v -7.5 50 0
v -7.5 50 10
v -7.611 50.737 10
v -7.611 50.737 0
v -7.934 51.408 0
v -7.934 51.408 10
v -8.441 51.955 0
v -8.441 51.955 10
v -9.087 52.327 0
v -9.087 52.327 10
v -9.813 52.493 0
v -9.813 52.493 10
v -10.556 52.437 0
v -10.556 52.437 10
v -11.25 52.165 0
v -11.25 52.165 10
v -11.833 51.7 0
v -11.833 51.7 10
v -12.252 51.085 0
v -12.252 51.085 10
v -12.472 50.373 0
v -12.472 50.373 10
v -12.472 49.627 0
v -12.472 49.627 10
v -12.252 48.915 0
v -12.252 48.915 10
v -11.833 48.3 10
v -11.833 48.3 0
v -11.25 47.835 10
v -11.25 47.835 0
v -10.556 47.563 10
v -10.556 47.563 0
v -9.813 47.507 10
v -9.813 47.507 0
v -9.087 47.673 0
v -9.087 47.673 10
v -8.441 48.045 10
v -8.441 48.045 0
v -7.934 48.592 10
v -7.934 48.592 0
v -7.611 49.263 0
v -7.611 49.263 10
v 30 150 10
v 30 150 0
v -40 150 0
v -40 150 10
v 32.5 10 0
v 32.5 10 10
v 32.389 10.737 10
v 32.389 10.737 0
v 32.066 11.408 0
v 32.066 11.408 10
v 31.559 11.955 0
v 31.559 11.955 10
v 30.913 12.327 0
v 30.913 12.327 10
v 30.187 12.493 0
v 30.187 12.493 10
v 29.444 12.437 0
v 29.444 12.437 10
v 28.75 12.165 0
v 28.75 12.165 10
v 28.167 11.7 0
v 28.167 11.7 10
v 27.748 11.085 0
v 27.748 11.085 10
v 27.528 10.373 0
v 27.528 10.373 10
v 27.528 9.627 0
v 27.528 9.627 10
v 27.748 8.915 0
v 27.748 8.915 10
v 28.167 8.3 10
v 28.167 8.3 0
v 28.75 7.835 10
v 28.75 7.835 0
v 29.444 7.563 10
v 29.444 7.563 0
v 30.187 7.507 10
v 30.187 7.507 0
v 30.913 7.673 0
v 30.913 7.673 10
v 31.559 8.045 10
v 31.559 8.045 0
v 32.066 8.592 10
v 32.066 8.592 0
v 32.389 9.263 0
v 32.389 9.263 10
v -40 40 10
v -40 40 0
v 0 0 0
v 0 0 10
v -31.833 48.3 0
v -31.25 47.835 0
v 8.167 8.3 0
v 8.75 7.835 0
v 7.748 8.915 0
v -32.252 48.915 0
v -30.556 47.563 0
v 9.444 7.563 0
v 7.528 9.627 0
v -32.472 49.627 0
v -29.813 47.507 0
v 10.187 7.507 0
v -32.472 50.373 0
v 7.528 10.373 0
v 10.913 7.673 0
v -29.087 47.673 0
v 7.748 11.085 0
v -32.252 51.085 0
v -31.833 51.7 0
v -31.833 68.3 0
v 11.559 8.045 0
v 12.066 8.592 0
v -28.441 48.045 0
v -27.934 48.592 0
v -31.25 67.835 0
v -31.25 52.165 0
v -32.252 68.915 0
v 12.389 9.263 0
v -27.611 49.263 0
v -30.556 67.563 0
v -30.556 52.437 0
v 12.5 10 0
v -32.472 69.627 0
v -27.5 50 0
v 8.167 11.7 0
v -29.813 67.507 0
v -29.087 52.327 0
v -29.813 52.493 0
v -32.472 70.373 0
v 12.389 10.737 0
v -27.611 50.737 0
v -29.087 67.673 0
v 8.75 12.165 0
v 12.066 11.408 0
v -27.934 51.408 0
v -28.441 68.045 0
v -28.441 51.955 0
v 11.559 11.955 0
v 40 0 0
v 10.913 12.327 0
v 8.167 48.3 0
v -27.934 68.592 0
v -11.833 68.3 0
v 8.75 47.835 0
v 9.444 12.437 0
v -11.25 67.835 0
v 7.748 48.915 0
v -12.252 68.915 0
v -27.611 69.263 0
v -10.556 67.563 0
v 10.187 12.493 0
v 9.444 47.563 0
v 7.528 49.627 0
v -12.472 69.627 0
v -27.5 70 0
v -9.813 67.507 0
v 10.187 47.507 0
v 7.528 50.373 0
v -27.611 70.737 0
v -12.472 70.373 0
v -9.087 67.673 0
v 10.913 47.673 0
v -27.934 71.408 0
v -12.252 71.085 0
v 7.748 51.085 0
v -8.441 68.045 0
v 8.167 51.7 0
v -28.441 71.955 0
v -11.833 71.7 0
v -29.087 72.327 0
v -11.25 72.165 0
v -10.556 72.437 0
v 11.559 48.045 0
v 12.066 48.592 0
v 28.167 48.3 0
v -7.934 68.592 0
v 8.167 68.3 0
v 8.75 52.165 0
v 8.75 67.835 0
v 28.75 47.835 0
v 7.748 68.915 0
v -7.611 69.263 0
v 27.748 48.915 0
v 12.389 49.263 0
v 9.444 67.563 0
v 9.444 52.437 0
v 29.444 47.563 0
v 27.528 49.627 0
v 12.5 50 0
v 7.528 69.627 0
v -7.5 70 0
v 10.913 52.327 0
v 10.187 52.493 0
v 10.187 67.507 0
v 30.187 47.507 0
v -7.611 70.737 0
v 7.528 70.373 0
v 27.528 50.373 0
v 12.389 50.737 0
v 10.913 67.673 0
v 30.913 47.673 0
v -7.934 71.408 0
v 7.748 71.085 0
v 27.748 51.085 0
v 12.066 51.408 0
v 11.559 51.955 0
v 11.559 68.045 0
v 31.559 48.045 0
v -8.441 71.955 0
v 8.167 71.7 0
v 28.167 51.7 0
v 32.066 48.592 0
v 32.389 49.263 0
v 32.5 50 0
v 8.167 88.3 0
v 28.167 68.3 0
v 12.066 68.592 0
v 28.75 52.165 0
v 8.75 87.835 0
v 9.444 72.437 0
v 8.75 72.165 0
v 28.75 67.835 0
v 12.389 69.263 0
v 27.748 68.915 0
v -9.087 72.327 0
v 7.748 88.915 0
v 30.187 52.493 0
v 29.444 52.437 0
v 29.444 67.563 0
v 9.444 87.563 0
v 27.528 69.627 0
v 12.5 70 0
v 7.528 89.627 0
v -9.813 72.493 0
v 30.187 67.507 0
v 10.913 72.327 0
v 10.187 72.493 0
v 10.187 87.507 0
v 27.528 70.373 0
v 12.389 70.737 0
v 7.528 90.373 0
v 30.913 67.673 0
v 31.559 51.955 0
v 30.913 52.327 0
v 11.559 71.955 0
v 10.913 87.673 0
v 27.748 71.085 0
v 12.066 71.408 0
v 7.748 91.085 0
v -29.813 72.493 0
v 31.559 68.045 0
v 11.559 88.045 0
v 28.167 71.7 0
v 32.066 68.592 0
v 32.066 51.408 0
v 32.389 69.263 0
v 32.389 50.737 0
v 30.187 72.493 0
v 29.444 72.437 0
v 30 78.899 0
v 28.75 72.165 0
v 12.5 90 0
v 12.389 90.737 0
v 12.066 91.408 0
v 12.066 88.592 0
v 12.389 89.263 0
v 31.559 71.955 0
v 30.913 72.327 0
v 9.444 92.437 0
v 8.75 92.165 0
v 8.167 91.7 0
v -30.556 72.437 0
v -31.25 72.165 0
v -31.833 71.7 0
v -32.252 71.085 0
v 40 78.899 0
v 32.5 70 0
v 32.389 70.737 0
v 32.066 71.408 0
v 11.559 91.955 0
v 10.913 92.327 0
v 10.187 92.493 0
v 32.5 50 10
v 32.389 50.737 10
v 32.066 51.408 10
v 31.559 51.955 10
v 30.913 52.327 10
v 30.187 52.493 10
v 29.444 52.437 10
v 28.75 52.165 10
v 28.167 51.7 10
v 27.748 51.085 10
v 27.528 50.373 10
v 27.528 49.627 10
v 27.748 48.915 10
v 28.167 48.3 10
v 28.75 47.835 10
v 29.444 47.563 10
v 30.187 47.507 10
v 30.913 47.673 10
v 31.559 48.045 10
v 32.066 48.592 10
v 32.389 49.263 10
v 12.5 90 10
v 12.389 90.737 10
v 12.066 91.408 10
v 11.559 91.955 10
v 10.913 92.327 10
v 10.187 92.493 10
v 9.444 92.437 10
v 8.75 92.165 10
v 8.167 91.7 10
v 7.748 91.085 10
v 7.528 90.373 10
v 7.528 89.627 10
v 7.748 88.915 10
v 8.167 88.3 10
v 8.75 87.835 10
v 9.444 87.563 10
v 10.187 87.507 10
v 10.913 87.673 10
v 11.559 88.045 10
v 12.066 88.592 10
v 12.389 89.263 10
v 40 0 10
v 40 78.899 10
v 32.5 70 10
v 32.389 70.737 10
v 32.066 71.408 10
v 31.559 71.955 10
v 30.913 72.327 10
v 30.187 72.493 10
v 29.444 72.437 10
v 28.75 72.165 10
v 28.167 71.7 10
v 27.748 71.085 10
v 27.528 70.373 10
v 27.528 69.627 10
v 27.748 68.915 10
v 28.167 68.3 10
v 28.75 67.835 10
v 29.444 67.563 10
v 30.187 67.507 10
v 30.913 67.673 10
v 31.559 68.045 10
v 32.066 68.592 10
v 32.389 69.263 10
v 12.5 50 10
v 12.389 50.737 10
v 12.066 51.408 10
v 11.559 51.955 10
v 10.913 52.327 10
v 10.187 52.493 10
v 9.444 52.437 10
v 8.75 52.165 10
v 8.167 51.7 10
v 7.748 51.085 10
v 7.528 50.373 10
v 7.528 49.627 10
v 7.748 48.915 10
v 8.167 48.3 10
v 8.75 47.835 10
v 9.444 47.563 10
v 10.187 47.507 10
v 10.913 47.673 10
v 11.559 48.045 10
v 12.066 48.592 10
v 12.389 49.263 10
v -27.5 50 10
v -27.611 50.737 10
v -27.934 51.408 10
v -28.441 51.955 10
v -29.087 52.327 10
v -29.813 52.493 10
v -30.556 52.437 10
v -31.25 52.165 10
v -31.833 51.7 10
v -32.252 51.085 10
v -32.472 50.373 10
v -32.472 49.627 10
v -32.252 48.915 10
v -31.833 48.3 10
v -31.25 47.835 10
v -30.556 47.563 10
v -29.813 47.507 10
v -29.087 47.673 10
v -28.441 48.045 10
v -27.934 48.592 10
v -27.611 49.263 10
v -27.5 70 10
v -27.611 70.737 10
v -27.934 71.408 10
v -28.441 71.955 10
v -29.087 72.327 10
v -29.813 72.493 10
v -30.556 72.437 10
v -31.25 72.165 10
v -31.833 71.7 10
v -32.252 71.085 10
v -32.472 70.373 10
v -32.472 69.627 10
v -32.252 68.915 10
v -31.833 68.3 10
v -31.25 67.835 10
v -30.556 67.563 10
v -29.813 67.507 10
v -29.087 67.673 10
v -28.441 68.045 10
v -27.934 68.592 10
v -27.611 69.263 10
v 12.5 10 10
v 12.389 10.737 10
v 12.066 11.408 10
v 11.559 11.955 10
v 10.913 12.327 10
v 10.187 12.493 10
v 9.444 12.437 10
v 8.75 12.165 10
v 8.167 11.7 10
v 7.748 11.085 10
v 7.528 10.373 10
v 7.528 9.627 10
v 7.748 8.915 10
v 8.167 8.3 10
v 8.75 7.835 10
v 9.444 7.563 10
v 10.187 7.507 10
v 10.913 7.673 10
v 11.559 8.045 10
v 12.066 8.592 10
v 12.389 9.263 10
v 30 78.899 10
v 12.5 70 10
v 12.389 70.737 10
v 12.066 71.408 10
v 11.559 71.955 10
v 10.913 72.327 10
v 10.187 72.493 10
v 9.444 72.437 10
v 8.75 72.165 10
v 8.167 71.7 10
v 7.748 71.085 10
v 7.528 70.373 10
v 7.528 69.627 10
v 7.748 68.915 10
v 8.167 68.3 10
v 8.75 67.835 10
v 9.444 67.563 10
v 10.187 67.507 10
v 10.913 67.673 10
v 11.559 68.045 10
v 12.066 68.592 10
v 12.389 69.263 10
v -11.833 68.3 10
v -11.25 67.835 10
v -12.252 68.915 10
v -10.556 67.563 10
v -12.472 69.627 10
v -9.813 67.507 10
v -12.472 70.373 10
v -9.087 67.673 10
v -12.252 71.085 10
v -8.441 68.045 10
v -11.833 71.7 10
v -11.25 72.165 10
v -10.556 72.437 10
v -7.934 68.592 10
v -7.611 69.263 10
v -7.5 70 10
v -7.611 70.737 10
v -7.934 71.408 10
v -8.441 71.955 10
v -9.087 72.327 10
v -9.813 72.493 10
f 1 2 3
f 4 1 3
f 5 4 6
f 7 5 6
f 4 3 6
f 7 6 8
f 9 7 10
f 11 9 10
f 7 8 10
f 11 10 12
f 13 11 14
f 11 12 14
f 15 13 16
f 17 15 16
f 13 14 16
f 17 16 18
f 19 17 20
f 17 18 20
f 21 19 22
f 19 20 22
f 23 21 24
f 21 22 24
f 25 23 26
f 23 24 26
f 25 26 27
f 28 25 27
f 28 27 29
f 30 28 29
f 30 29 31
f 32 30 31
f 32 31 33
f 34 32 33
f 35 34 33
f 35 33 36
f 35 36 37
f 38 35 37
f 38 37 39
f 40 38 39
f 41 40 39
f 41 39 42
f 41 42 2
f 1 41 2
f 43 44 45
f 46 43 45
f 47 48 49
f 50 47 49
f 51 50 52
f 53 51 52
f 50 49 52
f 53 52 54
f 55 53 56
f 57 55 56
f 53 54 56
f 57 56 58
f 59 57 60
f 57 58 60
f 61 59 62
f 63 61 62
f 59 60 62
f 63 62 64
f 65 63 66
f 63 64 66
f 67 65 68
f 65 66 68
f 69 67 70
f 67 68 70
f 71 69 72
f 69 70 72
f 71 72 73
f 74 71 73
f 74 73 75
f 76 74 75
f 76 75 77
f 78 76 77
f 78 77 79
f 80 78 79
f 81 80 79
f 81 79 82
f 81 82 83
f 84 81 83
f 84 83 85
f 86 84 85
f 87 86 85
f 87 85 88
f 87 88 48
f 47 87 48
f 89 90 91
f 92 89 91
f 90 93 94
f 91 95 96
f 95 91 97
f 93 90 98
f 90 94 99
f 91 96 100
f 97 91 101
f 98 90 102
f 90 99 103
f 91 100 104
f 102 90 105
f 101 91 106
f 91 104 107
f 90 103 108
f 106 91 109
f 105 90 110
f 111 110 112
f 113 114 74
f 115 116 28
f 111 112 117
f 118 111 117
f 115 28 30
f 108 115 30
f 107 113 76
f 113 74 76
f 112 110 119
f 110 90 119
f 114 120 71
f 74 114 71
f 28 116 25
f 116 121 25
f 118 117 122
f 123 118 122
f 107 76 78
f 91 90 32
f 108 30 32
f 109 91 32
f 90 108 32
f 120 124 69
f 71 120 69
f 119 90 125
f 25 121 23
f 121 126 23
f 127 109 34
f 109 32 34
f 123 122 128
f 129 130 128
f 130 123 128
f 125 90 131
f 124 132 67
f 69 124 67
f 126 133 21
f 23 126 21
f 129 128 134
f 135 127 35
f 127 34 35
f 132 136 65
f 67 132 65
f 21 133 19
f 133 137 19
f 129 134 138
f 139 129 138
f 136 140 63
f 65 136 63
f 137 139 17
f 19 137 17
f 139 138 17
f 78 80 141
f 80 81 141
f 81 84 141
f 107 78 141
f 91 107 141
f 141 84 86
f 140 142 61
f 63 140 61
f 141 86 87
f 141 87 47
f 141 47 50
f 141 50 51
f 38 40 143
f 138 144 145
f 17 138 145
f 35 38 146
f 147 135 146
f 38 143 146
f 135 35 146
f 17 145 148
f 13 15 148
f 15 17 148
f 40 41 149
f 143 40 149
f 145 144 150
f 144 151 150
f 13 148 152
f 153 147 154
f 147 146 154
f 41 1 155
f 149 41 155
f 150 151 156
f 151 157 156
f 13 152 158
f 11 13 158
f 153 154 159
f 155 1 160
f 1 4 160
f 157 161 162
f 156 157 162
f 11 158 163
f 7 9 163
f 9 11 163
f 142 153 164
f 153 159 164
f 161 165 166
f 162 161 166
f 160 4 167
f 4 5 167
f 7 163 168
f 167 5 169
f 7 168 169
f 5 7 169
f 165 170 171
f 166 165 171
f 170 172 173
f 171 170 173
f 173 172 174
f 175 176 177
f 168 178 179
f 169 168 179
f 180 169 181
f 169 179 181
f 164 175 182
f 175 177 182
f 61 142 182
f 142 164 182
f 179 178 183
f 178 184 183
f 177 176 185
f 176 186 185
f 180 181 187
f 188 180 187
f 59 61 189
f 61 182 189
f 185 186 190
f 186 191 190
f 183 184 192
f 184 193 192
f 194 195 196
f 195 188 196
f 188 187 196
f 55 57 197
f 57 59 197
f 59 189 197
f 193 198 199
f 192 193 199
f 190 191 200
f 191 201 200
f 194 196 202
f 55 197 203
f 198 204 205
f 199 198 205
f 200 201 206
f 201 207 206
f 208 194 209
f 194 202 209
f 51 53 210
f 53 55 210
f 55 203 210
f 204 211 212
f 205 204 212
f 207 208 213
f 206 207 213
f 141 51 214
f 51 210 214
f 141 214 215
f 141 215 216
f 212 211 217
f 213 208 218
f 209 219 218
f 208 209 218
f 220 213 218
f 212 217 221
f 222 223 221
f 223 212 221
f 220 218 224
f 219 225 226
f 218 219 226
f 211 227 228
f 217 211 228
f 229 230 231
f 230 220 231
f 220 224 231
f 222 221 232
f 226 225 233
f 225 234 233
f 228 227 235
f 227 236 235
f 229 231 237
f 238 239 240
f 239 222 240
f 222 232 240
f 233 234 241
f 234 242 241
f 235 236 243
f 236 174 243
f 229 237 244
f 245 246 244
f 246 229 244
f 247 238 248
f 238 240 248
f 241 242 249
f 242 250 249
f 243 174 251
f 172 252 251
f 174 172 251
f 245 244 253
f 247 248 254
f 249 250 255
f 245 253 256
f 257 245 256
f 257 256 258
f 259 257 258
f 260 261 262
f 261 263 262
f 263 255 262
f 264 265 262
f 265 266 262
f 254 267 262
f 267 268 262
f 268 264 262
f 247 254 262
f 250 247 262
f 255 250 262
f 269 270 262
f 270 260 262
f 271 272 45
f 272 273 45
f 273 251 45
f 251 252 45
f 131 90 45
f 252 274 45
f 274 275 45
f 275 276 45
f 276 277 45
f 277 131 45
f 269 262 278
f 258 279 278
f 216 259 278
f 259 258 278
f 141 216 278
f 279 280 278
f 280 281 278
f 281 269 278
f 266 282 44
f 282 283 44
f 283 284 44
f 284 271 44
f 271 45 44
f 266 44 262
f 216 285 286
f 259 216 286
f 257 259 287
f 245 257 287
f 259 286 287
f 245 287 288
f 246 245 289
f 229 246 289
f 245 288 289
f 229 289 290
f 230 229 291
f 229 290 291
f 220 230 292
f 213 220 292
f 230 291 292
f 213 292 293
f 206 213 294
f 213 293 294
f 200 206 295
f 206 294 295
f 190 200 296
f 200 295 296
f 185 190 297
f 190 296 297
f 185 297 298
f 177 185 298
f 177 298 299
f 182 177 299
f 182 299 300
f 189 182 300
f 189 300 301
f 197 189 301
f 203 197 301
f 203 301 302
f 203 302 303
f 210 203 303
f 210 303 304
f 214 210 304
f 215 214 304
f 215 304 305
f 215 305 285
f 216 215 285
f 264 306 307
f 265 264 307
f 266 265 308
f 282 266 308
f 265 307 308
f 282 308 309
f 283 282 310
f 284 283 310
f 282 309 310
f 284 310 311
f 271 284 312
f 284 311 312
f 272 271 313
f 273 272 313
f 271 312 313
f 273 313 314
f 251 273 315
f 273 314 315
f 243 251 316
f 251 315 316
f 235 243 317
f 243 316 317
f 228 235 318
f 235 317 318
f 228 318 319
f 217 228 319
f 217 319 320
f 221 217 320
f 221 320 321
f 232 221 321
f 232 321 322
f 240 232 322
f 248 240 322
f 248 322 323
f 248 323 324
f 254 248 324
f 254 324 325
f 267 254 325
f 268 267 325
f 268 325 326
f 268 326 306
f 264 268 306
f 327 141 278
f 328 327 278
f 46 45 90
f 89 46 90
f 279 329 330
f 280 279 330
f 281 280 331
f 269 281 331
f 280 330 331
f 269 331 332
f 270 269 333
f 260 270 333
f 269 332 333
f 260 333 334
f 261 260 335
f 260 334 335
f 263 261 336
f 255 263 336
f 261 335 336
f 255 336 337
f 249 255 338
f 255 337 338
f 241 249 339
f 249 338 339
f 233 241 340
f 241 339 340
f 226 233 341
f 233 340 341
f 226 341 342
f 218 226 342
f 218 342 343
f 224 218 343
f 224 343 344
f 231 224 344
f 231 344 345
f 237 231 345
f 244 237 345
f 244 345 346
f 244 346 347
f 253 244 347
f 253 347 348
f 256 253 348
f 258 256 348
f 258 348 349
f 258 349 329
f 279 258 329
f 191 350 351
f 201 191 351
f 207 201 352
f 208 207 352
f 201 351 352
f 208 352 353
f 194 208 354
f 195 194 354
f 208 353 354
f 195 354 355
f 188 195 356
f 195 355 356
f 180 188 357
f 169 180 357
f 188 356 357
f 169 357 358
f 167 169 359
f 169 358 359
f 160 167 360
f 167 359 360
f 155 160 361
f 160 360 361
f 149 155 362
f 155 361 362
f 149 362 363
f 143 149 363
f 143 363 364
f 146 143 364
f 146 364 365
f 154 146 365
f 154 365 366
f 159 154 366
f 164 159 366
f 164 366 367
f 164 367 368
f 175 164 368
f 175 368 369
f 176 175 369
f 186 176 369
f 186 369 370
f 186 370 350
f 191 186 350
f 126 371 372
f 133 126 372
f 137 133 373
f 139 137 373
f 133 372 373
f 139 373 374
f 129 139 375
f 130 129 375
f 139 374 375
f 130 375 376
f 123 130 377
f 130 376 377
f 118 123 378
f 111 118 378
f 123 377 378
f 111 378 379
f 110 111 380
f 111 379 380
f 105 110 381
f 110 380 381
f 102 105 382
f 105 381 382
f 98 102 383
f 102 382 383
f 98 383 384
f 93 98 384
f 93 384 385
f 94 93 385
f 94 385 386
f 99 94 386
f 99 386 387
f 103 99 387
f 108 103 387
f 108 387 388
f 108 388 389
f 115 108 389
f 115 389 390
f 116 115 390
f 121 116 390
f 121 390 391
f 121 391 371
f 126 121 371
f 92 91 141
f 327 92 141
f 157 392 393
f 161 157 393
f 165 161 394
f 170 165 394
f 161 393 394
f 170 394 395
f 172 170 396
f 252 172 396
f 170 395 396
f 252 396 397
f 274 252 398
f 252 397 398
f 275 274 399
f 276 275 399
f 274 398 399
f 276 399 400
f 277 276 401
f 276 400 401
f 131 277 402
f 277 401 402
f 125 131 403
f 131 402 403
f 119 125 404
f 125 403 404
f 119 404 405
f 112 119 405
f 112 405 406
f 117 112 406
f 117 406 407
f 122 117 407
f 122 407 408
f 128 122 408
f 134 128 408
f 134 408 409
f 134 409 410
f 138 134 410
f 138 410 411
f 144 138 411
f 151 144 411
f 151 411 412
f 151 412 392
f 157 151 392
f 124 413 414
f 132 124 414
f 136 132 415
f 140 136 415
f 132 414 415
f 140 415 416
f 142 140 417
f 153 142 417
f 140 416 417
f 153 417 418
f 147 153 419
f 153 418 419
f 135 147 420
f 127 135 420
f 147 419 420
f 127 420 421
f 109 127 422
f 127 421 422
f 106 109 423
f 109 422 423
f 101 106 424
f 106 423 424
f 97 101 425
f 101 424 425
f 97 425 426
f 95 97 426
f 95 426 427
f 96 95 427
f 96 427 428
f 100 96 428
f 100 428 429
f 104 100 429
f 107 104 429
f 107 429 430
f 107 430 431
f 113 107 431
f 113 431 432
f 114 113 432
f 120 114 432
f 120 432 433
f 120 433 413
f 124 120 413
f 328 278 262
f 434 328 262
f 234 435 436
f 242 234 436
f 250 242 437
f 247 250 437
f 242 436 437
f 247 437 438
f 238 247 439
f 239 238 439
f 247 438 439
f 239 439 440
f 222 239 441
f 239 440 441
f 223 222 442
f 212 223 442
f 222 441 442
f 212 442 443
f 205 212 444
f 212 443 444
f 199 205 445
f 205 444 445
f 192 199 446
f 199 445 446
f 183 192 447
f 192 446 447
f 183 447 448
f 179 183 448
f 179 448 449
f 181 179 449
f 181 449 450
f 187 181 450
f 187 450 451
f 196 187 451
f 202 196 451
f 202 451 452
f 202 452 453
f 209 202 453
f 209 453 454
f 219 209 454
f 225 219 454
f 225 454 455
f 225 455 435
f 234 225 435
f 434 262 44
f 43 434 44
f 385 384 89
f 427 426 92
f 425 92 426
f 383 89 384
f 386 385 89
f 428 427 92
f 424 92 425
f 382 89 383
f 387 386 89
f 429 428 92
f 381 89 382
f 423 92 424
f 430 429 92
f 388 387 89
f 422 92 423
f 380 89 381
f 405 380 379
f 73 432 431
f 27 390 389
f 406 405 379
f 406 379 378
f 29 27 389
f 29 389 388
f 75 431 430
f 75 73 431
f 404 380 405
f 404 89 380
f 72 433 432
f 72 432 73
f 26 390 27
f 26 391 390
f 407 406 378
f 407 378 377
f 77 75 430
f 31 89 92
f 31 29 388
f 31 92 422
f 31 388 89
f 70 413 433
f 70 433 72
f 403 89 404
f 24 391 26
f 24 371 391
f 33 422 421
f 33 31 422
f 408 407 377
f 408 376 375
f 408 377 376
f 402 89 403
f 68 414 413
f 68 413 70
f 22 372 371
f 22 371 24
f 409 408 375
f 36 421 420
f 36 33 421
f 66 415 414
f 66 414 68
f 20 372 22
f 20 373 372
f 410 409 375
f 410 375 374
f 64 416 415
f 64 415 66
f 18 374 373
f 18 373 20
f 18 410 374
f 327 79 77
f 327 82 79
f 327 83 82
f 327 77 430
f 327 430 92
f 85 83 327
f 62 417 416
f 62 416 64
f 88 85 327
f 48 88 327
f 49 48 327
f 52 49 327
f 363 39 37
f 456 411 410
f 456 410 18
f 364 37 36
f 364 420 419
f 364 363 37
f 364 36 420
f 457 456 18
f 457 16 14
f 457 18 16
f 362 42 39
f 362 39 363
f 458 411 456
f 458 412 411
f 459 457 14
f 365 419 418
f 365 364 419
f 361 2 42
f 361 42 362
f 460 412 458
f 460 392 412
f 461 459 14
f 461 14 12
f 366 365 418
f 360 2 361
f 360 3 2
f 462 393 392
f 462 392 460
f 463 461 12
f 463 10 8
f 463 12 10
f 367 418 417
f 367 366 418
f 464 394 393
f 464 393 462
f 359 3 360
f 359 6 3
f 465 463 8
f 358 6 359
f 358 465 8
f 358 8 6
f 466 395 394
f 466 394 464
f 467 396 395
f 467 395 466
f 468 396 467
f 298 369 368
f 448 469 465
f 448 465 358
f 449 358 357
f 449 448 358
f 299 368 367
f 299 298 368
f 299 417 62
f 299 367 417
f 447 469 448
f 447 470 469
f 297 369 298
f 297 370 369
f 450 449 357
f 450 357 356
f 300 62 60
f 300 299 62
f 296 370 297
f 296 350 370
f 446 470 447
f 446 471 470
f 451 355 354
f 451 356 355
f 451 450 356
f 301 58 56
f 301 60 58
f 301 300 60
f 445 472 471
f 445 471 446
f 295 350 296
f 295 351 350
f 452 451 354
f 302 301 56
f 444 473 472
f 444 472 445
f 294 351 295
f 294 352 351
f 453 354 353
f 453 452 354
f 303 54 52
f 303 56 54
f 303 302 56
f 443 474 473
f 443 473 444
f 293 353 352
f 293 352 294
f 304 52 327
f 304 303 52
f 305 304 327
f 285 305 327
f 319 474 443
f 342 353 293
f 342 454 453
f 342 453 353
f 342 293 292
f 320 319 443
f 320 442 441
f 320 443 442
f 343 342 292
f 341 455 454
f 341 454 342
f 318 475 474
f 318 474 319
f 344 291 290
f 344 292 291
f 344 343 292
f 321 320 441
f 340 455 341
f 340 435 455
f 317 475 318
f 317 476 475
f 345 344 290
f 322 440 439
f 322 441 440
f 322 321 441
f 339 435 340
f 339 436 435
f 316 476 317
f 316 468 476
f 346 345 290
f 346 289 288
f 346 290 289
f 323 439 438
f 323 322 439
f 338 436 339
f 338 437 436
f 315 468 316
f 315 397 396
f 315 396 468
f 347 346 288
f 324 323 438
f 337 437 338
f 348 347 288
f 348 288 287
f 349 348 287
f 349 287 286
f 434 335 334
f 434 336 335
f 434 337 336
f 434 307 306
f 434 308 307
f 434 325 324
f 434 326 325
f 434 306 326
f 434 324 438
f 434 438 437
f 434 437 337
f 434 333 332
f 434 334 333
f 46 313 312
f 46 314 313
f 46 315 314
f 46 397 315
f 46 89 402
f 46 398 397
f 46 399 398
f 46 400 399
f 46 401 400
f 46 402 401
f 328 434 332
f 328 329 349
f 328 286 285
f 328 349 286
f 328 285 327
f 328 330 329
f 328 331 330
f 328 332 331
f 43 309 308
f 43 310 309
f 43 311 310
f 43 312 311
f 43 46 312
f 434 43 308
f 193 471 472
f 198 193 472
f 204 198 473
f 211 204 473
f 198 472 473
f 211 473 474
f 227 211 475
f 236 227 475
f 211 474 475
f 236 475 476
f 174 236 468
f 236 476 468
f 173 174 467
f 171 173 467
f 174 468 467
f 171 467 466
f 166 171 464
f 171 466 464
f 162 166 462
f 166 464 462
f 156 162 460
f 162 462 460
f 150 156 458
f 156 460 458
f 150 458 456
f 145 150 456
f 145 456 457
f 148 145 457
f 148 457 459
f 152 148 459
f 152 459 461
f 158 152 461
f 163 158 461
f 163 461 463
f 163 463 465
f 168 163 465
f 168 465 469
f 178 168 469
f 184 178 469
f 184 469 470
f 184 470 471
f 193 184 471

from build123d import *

# Parameters (mm, degrees)
BOSS_EXTRUDE1_DEPTH = 10
CUT_EXTRUDE1_REACH  = 157.563
SKETCH2_R           = 2.5


with BuildPart() as part:
    # Sketch1 → Boss-Extrude1 (new body)
    with BuildSketch(Plane.XY):
        Polygon((0, 0), (40, 0), (40, 78.89880614), (30, 78.89880614), (30, 150), (-40, 150), (-40, 80), (-40, 40), align=None)
    extrude(amount=BOSS_EXTRUDE1_DEPTH)

    # Sketch2 → Cut-Extrude1 (cut, up to next)
    with BuildSketch(Plane.XY.offset(10), mode=Mode.PRIVATE) as cut_extrude1_sk1:
        with Locations((-30, 70)):
            Circle(SKETCH2_R)
    cut_extrude1_tool1 = extrude(cut_extrude1_sk1.sketch, amount=-CUT_EXTRUDE1_REACH, mode=Mode.PRIVATE) & part.part
    # Sketch2 → Cut-Extrude1 (cut, up to next)
    with BuildSketch(Plane.XY.offset(10), mode=Mode.PRIVATE) as cut_extrude1_sk2:
        with Locations((-10, 70)):
            Circle(SKETCH2_R)
    cut_extrude1_tool2 = extrude(cut_extrude1_sk2.sketch, amount=-CUT_EXTRUDE1_REACH, mode=Mode.PRIVATE) & part.part
    # Sketch2 → Cut-Extrude1 (cut, up to next)
    with BuildSketch(Plane.XY.offset(10), mode=Mode.PRIVATE) as cut_extrude1_sk3:
        with Locations((-30, 50)):
            Circle(SKETCH2_R)
    cut_extrude1_tool3 = extrude(cut_extrude1_sk3.sketch, amount=-CUT_EXTRUDE1_REACH, mode=Mode.PRIVATE) & part.part
    # Sketch2 → Cut-Extrude1 (cut, up to next)
    with BuildSketch(Plane.XY.offset(10), mode=Mode.PRIVATE) as cut_extrude1_sk4:
        with Locations((-10, 50)):
            Circle(SKETCH2_R)
    cut_extrude1_tool4 = extrude(cut_extrude1_sk4.sketch, amount=-CUT_EXTRUDE1_REACH, mode=Mode.PRIVATE) & part.part
    # Sketch2 → Cut-Extrude1 (cut, up to next)
    with BuildSketch(Plane.XY.offset(10), mode=Mode.PRIVATE) as cut_extrude1_sk5:
        with Locations((10, 50)):
            Circle(SKETCH2_R)
    cut_extrude1_tool5 = extrude(cut_extrude1_sk5.sketch, amount=-CUT_EXTRUDE1_REACH, mode=Mode.PRIVATE) & part.part
    # Sketch2 → Cut-Extrude1 (cut, up to next)
    with BuildSketch(Plane.XY.offset(10), mode=Mode.PRIVATE) as cut_extrude1_sk6:
        with Locations((30, 50)):
            Circle(SKETCH2_R)
    cut_extrude1_tool6 = extrude(cut_extrude1_sk6.sketch, amount=-CUT_EXTRUDE1_REACH, mode=Mode.PRIVATE) & part.part
    # Sketch2 → Cut-Extrude1 (cut, up to next)
    with BuildSketch(Plane.XY.offset(10), mode=Mode.PRIVATE) as cut_extrude1_sk7:
        with Locations((10, 10)):
            Circle(SKETCH2_R)
    cut_extrude1_tool7 = extrude(cut_extrude1_sk7.sketch, amount=-CUT_EXTRUDE1_REACH, mode=Mode.PRIVATE) & part.part
    # Sketch2 → Cut-Extrude1 (cut, up to next)
    with BuildSketch(Plane.XY.offset(10), mode=Mode.PRIVATE) as cut_extrude1_sk8:
        with Locations((30, 10)):
            Circle(SKETCH2_R)
    cut_extrude1_tool8 = extrude(cut_extrude1_sk8.sketch, amount=-CUT_EXTRUDE1_REACH, mode=Mode.PRIVATE) & part.part
    # Sketch2 → Cut-Extrude1 (cut, up to next)
    with BuildSketch(Plane.XY.offset(10), mode=Mode.PRIVATE) as cut_extrude1_sk9:
        with Locations((10, 90)):
            Circle(SKETCH2_R)
    cut_extrude1_tool9 = extrude(cut_extrude1_sk9.sketch, amount=-CUT_EXTRUDE1_REACH, mode=Mode.PRIVATE) & part.part
    # Sketch2 → Cut-Extrude1 (cut, up to next)
    with BuildSketch(Plane.XY.offset(10), mode=Mode.PRIVATE) as cut_extrude1_sk10:
        with Locations((10, 70)):
            Circle(SKETCH2_R)
    cut_extrude1_tool10 = extrude(cut_extrude1_sk10.sketch, amount=-CUT_EXTRUDE1_REACH, mode=Mode.PRIVATE) & part.part
    # Sketch2 → Cut-Extrude1 (cut, up to next)
    with BuildSketch(Plane.XY.offset(10), mode=Mode.PRIVATE) as cut_extrude1_sk11:
        with Locations((30, 70)):
            Circle(SKETCH2_R)
    cut_extrude1_tool11 = extrude(cut_extrude1_sk11.sketch, amount=-CUT_EXTRUDE1_REACH, mode=Mode.PRIVATE) & part.part
    add(cut_extrude1_tool1.solids().sort_by_distance((-30, 70, 10))[0], mode=Mode.SUBTRACT)
    add(cut_extrude1_tool2.solids().sort_by_distance((-10, 70, 10))[0], mode=Mode.SUBTRACT)
    add(cut_extrude1_tool3.solids().sort_by_distance((-30, 50, 10))[0], mode=Mode.SUBTRACT)
    add(cut_extrude1_tool4.solids().sort_by_distance((-10, 50, 10))[0], mode=Mode.SUBTRACT)
    add(cut_extrude1_tool5.solids().sort_by_distance((10, 50, 10))[0], mode=Mode.SUBTRACT)
    add(cut_extrude1_tool6.solids().sort_by_distance((30, 50, 10))[0], mode=Mode.SUBTRACT)
    add(cut_extrude1_tool7.solids().sort_by_distance((10, 10, 10))[0], mode=Mode.SUBTRACT)
    add(cut_extrude1_tool8.solids().sort_by_distance((30, 10, 10))[0], mode=Mode.SUBTRACT)
    add(cut_extrude1_tool9.solids().sort_by_distance((10, 90, 10))[0], mode=Mode.SUBTRACT)
    add(cut_extrude1_tool10.solids().sort_by_distance((10, 70, 10))[0], mode=Mode.SUBTRACT)
    add(cut_extrude1_tool11.solids().sort_by_distance((30, 70, 10))[0], mode=Mode.SUBTRACT)


solid = part.part
